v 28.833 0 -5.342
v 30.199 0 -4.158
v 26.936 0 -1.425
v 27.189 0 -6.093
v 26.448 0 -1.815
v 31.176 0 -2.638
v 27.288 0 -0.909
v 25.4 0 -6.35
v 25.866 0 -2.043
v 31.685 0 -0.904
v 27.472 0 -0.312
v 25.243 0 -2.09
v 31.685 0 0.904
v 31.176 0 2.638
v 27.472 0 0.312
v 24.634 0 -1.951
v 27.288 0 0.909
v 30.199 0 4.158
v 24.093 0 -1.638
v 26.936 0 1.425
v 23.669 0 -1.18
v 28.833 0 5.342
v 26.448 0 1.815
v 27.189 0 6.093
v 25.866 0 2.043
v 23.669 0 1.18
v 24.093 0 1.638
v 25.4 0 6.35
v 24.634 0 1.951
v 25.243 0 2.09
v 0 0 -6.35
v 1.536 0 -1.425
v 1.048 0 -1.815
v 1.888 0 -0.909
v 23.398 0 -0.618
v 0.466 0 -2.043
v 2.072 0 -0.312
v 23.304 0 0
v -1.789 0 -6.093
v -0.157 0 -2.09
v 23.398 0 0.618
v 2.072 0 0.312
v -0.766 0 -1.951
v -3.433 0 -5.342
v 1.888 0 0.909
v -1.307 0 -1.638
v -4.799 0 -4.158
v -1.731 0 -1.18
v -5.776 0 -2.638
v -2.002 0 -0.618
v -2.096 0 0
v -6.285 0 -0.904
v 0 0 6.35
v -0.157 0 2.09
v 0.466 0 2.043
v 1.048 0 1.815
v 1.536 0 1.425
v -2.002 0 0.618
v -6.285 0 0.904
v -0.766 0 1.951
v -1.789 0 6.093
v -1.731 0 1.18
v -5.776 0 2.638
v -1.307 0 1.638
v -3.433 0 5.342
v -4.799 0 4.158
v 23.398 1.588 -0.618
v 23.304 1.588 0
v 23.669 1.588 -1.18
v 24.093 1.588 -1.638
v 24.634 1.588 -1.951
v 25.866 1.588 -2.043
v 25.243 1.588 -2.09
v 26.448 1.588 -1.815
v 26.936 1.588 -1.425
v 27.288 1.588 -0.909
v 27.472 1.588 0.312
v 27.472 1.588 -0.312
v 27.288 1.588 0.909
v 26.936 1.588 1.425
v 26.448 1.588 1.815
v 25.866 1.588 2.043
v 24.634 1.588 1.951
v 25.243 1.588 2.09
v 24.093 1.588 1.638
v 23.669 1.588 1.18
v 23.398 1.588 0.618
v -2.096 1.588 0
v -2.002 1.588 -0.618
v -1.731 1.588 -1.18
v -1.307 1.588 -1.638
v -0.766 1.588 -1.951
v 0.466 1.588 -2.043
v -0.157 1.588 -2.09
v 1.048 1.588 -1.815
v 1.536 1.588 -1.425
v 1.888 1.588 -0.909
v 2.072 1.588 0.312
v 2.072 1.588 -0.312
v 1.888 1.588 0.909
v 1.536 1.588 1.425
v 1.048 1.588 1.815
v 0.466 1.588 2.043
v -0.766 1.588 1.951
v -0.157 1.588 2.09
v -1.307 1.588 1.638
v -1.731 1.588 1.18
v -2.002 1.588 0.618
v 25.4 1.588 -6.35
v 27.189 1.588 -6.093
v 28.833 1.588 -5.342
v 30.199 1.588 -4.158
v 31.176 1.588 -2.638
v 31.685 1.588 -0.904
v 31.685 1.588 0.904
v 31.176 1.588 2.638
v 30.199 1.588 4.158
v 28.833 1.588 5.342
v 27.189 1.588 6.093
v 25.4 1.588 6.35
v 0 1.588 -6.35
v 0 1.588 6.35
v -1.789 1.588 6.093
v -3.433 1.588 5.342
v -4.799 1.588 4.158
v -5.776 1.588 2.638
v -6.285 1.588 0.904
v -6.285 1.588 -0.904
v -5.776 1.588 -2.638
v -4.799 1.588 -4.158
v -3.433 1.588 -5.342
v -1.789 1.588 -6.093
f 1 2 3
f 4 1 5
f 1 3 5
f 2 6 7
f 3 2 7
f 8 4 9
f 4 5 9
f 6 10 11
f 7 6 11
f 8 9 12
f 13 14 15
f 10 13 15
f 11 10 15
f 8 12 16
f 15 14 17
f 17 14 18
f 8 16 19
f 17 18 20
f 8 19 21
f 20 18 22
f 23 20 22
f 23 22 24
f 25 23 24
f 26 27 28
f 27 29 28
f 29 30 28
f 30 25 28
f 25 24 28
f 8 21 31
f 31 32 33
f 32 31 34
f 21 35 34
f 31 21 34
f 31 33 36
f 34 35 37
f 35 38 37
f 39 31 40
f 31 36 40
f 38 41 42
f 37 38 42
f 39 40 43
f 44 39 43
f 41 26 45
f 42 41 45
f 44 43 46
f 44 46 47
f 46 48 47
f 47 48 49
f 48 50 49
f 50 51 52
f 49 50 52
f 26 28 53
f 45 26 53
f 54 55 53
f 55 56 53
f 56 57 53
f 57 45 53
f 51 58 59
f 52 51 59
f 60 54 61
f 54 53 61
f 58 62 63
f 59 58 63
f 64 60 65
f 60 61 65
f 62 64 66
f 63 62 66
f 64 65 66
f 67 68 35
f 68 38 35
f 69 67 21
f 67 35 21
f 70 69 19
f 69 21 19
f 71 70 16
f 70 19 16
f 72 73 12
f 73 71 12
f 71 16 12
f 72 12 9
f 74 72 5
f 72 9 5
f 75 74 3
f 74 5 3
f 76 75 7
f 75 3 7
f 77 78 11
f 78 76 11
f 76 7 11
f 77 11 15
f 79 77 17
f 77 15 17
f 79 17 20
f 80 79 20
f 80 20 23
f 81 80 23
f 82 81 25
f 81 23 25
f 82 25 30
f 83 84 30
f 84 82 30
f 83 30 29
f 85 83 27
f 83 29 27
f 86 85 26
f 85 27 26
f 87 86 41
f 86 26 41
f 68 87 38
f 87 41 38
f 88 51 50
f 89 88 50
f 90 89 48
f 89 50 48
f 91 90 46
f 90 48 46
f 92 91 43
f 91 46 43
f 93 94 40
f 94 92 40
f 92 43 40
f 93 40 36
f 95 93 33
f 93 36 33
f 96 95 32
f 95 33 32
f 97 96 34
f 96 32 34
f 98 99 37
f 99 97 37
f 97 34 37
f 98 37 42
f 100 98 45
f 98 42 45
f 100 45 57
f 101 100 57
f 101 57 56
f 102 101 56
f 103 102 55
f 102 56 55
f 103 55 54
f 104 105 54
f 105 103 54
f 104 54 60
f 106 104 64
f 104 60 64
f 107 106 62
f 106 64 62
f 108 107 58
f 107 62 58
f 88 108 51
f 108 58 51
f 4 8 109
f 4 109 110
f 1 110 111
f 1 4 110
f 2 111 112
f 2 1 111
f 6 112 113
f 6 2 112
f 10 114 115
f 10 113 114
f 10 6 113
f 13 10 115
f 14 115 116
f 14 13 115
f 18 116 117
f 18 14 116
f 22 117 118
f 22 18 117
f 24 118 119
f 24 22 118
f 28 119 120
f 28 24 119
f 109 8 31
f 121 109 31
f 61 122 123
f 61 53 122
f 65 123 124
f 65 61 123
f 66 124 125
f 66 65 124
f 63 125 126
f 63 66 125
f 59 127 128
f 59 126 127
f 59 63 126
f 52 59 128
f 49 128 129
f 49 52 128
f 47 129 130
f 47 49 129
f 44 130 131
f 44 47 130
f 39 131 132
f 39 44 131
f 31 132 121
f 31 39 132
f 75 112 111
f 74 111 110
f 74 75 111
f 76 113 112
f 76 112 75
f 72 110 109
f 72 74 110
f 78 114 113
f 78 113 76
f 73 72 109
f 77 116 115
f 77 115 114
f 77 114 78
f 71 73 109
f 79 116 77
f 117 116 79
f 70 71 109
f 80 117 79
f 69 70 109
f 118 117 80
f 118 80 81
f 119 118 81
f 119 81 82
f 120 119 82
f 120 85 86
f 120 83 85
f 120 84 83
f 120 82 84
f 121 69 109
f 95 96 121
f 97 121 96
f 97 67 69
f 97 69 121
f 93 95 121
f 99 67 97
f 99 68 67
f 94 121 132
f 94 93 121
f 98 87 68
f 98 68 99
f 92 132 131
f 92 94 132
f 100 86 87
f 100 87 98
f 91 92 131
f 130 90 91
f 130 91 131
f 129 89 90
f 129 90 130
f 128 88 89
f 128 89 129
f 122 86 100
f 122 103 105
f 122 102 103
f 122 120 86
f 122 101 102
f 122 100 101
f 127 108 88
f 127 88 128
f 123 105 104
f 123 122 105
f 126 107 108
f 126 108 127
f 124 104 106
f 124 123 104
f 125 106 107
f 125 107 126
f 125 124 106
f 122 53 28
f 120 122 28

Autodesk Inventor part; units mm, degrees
ref_plane "YZ Plane" through (0, 0, 0) normal (1, 0, 0) x (0, 1, 0)
ref_plane "XZ Plane" through (0, 0, 0) normal (0, 1, 0) x (-1, 0, 0)
ref_plane "XY Plane" through (0, 0, 0) normal (0, 0, 1) x (1, 0, 0)
sketch "Sketch1" plane through (0, 0, 0) normal (0, 1, 0) x (-1, 0, 0)
  circle A0 centre (0, 0) radius 2.0955
  circle A1 centre (-25.4, 0) radius 2.0955
  arc A2 (0, -6.35) -> (0, 6.35) centre (0, 0) ccw
  arc A3 (-25.4, 6.35) -> (-25.4, -6.35) centre (-25.4, 0) ccw
  line L0 (0, 6.35) -> (-25.4, 6.35)
  line L1 (-25.4, -6.35) -> (0, -6.35)
  dimension "d0" = 4.191
  dimension "d1" = 4.191
  dimension "d2" = 12.7
  dimension "d3" = 12.7
extrude "Extrusion1" add sketch "Sketch1" along normal blind 1.5875
properties part number "Gear Shield" material "Acetal Resin, White"
